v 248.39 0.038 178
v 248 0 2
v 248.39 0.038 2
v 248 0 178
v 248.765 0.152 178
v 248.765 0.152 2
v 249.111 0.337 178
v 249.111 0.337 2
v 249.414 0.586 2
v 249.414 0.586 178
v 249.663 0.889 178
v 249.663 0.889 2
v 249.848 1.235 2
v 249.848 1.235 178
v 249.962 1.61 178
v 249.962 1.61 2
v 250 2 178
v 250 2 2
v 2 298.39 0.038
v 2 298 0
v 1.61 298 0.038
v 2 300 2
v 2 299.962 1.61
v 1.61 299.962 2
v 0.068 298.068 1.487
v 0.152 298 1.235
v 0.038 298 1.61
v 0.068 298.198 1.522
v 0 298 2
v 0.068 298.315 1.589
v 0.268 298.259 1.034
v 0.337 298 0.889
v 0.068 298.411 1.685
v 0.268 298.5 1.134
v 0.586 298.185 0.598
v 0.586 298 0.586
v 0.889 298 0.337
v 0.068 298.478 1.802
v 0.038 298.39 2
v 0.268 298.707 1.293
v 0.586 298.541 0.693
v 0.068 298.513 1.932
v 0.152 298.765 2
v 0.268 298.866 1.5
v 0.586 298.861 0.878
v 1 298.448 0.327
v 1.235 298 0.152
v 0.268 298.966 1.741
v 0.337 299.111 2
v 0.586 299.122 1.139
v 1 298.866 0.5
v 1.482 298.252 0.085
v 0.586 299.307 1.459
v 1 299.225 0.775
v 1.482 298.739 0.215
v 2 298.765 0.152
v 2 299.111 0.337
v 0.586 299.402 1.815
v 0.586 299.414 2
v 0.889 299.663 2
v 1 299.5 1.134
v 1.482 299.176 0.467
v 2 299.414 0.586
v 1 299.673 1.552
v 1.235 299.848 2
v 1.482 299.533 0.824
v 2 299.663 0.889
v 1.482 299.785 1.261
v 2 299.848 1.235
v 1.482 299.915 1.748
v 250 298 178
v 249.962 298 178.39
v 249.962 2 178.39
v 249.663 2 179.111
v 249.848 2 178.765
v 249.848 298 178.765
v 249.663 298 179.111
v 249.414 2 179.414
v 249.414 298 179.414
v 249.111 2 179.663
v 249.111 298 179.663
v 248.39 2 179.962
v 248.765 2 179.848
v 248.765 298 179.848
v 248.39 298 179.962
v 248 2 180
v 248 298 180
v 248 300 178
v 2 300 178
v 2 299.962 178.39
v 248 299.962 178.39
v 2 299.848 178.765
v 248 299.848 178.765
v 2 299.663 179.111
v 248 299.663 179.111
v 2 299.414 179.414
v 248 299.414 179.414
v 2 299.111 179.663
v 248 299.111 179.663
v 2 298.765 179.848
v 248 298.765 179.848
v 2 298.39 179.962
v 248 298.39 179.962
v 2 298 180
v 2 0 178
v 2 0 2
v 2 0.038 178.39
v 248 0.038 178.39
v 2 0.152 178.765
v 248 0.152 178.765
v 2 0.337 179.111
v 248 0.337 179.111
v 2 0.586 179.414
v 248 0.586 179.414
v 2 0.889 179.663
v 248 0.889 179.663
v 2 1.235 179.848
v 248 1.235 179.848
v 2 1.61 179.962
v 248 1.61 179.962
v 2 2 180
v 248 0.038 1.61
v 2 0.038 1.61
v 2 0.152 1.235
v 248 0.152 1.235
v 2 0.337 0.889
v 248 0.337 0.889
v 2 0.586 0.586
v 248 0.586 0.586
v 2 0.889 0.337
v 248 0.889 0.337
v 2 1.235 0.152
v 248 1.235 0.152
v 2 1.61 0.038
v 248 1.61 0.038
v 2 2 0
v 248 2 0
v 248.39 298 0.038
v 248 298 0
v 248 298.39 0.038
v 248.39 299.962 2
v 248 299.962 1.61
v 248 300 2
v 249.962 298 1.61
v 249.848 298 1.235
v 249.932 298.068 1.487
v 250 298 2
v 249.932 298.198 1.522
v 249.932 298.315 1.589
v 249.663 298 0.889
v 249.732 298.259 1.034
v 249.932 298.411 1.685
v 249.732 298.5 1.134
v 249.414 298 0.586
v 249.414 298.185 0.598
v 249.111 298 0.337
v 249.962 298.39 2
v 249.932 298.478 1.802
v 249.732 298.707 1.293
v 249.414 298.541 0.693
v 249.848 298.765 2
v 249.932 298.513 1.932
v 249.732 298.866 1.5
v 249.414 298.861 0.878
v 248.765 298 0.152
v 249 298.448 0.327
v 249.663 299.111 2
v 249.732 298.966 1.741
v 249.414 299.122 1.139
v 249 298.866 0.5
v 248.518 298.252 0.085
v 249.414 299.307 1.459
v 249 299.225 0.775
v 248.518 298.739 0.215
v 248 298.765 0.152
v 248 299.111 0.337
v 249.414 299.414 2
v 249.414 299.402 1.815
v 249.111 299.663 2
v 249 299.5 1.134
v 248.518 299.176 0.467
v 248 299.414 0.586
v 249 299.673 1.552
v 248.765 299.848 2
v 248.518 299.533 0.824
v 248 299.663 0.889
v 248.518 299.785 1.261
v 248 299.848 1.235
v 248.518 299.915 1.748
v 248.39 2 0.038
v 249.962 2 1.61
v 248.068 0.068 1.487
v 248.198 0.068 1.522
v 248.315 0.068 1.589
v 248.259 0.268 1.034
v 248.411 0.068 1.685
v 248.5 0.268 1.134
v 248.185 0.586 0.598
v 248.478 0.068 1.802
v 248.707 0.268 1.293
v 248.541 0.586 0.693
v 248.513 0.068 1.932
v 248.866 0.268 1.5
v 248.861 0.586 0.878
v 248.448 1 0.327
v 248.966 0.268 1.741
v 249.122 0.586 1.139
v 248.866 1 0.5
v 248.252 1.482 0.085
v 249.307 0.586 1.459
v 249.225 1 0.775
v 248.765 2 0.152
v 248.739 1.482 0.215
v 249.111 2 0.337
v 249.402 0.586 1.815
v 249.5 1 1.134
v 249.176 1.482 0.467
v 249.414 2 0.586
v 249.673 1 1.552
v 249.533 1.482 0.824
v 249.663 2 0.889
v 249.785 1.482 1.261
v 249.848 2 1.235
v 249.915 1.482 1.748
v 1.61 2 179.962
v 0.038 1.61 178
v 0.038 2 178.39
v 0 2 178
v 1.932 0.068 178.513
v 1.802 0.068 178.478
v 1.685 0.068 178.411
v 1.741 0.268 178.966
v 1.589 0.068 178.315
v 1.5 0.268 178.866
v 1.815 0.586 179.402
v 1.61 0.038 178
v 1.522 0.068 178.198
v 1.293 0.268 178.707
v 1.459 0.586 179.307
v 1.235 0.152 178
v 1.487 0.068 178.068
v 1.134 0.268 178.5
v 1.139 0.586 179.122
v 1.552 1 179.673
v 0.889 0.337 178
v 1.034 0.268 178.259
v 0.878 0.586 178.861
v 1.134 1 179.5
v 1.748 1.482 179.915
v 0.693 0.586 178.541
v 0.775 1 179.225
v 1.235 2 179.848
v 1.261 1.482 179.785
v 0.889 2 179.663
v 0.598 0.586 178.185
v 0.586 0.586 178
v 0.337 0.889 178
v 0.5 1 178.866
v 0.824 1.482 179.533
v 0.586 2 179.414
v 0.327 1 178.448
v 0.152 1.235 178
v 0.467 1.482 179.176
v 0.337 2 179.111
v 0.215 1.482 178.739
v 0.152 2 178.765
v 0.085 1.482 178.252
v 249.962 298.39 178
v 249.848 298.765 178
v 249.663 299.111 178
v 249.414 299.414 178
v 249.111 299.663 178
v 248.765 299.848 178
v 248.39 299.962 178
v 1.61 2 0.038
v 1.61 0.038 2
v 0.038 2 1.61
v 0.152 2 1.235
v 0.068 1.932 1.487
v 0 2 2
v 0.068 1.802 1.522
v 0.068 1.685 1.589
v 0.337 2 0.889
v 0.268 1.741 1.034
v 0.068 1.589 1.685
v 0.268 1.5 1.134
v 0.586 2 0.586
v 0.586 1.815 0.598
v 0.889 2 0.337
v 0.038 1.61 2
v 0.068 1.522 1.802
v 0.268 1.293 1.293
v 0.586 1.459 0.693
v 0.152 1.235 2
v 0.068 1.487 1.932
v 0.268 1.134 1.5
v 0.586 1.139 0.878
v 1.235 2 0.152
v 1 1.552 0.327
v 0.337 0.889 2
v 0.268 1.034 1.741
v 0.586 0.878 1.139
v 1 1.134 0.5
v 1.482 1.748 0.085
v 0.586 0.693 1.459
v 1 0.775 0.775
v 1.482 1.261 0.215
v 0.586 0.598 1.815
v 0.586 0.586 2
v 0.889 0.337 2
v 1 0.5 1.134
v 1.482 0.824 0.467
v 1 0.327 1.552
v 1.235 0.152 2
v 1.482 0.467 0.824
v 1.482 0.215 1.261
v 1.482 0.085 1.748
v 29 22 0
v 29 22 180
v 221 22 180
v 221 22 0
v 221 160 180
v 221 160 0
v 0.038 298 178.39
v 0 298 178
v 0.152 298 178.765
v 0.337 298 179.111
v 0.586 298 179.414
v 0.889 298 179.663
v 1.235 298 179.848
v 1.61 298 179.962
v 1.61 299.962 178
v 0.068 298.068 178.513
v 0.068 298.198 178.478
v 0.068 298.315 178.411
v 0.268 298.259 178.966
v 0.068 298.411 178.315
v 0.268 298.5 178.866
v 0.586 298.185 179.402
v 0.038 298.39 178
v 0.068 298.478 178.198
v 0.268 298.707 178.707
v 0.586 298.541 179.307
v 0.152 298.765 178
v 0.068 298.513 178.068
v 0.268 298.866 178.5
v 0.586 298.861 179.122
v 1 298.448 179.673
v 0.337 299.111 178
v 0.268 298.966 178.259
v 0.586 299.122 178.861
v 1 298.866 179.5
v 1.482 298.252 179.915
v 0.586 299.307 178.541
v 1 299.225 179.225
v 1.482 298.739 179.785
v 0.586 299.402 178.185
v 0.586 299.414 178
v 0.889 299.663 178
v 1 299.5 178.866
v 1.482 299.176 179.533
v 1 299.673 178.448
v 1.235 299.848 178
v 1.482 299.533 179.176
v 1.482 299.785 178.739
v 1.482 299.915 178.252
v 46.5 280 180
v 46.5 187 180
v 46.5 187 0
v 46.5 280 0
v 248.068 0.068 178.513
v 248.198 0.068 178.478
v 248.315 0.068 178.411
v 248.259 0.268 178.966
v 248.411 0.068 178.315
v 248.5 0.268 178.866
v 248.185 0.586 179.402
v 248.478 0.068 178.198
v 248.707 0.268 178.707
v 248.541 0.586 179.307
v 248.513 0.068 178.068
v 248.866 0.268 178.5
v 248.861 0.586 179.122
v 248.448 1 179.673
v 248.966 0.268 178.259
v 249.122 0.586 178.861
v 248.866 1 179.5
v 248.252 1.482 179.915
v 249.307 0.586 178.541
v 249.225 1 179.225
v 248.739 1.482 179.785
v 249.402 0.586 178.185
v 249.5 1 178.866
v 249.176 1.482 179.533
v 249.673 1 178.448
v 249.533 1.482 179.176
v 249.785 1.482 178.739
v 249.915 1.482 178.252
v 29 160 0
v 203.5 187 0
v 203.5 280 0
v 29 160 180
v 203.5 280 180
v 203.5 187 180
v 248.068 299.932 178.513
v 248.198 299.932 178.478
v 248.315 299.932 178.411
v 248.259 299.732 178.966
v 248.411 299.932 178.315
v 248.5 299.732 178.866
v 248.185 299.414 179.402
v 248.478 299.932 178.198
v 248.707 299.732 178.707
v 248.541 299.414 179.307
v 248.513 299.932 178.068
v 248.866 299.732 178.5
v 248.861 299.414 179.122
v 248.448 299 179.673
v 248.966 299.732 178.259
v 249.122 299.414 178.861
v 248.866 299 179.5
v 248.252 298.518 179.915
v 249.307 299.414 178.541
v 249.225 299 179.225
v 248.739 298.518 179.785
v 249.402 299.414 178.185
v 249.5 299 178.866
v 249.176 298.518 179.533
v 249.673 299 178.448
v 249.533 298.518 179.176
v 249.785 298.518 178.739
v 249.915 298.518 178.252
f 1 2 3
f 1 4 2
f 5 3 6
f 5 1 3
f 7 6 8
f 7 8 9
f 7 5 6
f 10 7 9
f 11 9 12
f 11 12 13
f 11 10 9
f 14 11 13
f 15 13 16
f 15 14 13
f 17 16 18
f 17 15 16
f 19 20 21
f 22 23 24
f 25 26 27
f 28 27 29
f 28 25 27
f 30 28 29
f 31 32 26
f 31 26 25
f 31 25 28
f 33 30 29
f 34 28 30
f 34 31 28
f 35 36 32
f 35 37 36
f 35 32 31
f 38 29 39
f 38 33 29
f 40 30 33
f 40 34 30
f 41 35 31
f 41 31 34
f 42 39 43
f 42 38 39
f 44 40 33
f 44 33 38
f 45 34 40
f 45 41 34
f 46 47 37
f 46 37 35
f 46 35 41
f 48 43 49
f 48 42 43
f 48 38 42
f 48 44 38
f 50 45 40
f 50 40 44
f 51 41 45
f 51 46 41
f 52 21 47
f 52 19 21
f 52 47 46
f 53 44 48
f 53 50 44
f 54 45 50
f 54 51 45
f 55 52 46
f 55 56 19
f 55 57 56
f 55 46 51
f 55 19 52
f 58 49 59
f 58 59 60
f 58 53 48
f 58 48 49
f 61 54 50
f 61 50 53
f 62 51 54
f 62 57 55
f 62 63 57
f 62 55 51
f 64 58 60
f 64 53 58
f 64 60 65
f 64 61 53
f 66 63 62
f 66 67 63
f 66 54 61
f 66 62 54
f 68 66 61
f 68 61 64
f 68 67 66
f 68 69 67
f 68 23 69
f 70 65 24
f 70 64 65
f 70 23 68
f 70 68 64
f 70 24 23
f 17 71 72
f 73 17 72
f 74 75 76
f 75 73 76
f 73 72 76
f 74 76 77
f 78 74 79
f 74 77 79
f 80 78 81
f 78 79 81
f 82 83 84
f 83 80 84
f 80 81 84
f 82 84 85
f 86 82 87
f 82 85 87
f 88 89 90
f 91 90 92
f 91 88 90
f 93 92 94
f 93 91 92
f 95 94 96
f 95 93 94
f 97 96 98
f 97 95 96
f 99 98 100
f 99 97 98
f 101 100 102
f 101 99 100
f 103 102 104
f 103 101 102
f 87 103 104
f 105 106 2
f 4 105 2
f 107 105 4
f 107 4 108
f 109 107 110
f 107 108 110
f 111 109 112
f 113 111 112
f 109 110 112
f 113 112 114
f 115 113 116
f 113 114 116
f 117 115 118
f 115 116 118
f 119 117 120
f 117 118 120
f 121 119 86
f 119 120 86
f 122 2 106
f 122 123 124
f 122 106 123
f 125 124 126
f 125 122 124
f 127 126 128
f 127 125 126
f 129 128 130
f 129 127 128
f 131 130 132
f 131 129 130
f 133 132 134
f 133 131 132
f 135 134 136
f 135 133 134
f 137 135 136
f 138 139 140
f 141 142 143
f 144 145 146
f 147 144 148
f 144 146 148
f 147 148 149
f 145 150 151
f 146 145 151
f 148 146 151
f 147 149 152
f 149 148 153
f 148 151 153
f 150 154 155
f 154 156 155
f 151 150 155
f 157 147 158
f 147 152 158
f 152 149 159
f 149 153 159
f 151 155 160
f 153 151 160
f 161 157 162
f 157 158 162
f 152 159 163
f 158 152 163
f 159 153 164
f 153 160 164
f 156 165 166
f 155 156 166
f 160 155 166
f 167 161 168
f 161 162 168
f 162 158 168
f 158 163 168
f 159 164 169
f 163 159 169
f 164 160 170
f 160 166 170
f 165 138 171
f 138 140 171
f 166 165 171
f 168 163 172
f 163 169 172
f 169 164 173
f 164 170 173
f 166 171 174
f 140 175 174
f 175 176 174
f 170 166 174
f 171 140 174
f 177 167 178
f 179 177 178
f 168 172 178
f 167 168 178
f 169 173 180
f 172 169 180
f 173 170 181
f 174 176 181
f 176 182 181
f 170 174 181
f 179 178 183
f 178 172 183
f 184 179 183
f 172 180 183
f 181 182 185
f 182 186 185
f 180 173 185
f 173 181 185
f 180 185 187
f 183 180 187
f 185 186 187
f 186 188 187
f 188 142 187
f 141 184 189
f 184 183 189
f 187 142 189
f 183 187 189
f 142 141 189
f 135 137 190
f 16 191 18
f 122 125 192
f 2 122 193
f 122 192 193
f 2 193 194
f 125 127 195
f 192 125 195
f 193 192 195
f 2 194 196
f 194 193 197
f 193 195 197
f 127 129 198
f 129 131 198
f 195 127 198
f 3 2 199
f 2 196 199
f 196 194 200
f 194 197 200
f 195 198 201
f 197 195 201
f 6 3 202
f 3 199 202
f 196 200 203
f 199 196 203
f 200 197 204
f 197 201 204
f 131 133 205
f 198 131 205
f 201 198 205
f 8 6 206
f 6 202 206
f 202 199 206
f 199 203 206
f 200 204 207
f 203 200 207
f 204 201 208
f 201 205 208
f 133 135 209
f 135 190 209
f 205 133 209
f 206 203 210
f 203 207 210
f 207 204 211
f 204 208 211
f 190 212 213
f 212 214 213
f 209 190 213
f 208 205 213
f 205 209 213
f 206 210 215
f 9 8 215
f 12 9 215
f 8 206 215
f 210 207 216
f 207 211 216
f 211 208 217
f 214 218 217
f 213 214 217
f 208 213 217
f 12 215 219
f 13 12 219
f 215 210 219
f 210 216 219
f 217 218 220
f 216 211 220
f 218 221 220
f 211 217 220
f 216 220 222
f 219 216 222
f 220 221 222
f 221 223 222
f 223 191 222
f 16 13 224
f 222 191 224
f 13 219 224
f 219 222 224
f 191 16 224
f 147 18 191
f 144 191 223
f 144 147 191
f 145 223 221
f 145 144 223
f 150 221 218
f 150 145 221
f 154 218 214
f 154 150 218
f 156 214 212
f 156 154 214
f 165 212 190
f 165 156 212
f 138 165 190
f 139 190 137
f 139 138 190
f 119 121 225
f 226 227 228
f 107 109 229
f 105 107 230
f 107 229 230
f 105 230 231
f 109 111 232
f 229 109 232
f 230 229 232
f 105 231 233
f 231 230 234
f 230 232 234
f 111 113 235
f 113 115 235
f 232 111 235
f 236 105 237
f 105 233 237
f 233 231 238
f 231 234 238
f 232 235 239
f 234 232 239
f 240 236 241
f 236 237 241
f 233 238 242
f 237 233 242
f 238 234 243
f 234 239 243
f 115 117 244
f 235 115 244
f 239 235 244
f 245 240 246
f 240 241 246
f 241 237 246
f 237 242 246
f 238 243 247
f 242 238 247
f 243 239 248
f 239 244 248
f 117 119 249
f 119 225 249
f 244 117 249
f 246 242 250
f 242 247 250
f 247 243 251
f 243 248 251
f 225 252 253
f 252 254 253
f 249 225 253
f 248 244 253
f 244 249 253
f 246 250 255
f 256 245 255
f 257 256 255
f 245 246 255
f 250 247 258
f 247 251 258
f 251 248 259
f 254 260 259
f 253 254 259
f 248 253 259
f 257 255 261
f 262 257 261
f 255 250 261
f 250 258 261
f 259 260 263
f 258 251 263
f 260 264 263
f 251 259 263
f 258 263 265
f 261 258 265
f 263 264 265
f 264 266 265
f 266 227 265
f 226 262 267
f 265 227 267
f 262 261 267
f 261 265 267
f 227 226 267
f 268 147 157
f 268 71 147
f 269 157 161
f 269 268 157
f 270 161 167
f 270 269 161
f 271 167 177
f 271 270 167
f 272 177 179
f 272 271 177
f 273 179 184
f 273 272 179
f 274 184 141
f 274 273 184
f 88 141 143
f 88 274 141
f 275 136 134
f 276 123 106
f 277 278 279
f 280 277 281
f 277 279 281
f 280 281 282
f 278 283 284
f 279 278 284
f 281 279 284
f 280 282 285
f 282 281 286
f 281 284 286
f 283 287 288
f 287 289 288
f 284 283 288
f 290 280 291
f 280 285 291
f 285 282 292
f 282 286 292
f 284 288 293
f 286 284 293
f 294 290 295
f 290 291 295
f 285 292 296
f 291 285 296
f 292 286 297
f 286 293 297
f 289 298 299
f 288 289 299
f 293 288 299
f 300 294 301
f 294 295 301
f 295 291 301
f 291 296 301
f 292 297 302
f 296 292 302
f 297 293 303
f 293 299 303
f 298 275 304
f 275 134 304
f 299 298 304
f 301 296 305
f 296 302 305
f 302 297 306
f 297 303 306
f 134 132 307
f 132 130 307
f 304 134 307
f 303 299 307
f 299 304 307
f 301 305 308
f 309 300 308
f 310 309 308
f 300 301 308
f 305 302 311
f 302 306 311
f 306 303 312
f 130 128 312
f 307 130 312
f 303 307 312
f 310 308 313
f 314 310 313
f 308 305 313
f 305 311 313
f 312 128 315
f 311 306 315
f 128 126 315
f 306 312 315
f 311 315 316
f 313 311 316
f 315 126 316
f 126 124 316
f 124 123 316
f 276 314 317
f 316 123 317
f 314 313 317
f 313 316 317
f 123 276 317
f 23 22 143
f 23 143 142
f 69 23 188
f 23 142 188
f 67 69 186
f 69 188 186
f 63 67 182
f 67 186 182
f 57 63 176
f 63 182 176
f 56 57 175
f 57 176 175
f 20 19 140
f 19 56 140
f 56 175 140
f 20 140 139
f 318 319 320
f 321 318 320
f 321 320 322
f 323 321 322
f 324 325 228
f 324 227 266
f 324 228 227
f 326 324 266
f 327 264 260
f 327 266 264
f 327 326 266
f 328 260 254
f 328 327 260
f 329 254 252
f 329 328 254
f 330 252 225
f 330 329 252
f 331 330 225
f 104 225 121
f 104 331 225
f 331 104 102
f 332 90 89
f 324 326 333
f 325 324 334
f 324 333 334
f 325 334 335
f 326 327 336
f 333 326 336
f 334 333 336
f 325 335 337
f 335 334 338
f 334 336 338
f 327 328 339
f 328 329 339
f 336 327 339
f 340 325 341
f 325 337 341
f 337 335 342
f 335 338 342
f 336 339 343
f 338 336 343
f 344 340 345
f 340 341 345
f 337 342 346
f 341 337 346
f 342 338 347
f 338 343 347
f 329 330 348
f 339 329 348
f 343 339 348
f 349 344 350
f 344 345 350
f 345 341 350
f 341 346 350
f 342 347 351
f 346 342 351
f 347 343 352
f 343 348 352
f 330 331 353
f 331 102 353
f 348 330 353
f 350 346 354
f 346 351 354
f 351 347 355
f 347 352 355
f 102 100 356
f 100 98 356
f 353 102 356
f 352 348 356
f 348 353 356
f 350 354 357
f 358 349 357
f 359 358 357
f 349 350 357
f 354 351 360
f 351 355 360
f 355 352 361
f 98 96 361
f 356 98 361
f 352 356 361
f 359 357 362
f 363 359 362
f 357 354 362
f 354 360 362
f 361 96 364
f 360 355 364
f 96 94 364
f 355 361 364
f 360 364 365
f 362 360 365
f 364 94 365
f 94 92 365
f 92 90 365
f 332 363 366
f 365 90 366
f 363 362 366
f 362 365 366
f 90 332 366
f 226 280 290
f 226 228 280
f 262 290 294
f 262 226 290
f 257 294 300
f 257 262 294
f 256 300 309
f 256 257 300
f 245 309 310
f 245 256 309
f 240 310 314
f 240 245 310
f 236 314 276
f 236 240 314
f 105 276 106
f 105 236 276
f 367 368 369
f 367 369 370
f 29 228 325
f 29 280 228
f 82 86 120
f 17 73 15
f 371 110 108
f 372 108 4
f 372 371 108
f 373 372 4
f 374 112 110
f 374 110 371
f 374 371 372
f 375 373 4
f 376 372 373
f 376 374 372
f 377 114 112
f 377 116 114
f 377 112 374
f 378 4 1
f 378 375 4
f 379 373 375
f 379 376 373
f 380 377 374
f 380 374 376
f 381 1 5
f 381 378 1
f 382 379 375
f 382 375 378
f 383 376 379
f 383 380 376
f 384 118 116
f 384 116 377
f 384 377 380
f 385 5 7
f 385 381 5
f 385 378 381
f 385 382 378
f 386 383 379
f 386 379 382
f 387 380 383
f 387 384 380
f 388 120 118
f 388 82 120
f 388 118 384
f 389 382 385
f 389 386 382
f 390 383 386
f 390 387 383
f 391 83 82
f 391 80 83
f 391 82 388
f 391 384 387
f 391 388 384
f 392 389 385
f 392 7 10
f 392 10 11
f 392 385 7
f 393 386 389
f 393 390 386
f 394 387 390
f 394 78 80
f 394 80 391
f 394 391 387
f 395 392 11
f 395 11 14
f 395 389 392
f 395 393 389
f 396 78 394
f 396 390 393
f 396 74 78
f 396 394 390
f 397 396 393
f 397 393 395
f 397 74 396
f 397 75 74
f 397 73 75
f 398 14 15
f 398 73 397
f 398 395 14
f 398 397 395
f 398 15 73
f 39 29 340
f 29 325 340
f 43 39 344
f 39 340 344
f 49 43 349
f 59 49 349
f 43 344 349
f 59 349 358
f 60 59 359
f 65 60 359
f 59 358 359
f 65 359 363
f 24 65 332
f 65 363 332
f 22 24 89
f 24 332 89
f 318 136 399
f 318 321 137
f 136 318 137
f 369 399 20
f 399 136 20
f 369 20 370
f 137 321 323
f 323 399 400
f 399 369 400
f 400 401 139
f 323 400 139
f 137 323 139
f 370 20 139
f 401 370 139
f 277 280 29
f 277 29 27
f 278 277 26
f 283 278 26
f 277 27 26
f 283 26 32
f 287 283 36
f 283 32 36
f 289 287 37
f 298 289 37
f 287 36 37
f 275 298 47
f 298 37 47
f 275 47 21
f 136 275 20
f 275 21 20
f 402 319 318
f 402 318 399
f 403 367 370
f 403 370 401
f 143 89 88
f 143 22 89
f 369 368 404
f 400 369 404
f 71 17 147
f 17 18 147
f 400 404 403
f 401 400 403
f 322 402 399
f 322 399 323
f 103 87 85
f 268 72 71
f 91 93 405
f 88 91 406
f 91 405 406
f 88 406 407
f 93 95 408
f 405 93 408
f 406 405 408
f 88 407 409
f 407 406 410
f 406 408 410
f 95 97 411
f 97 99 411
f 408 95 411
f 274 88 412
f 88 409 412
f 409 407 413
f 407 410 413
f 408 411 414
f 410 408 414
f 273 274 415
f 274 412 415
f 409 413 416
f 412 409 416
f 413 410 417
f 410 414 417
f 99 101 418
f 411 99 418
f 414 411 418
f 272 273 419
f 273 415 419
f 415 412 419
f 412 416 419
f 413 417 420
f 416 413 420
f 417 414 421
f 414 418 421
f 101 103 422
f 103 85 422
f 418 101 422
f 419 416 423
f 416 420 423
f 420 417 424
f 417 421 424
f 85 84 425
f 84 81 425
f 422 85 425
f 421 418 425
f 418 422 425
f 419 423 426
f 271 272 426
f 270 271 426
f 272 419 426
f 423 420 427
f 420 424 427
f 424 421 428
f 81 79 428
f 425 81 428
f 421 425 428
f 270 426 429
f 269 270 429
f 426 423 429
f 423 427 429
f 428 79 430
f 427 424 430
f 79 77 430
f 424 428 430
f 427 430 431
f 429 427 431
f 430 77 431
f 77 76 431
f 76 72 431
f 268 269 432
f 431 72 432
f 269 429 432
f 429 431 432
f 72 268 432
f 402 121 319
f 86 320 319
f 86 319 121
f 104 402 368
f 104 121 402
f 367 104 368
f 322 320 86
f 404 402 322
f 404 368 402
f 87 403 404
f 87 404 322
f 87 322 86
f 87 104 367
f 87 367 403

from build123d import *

# Parameters (mm, degrees)
SKETCH_1_W          = 250
SKETCH_1_H          = 300
EXTRUDE_1_DEPTH     = 180
FILLET_1_R          = 2
CUT_EXTRUDE_1_REACH = 432
SKETCH_2_W          = 157
SKETCH_2_H          = 93
SKETCH_2_W_2        = 192
SKETCH_2_H_2        = 138


with BuildPart() as part:
    # 草图1 → 凸台-拉伸1 (new body)
    with BuildSketch(Plane.XY):
        with Locations((125, 150)):
            Rectangle(SKETCH_1_W, SKETCH_1_H)
    extrude(amount=EXTRUDE_1_DEPTH)

    # 圆角1
    fillet_1_edges = [part.edges().sort_by_distance(p)[0] for p in [
        (250, 150, 180),
        (125, 300, 180),
        (0, 150, 180),
        (125, 300, 0),
        (250, 150, 0),
        (125, 0, 0),
        (0, 150, 0),
        (125, 0, 180),
        (0, 300, 90),
        (250, 300, 90),
        (250, 0, 90),
        (0, 0, 90),
    ]]
    fillet(fillet_1_edges, radius=FILLET_1_R)

    # 草图2 → 切除-拉伸1 (cut, up to next)
    with BuildSketch(Plane.XY.offset(180), mode=Mode.PRIVATE) as cut_extrude_1_sk1:
        with Locations((125, 233.5)):
            Rectangle(SKETCH_2_W, SKETCH_2_H)
    cut_extrude_1_tool1 = extrude(cut_extrude_1_sk1.sketch, amount=-CUT_EXTRUDE_1_REACH, mode=Mode.PRIVATE) & part.part
    # 草图2 → 切除-拉伸1 (cut, up to next)
    with BuildSketch(Plane.XY.offset(180), mode=Mode.PRIVATE) as cut_extrude_1_sk2:
        with Locations((125, 91)):
            Rectangle(SKETCH_2_W_2, SKETCH_2_H_2)
    cut_extrude_1_tool2 = extrude(cut_extrude_1_sk2.sketch, amount=-CUT_EXTRUDE_1_REACH, mode=Mode.PRIVATE) & part.part
    add(cut_extrude_1_tool1.solids().sort_by_distance((125, 233.5, 180))[0], mode=Mode.SUBTRACT)
    add(cut_extrude_1_tool2.solids().sort_by_distance((125, 91, 180))[0], mode=Mode.SUBTRACT)


solid = part.part
